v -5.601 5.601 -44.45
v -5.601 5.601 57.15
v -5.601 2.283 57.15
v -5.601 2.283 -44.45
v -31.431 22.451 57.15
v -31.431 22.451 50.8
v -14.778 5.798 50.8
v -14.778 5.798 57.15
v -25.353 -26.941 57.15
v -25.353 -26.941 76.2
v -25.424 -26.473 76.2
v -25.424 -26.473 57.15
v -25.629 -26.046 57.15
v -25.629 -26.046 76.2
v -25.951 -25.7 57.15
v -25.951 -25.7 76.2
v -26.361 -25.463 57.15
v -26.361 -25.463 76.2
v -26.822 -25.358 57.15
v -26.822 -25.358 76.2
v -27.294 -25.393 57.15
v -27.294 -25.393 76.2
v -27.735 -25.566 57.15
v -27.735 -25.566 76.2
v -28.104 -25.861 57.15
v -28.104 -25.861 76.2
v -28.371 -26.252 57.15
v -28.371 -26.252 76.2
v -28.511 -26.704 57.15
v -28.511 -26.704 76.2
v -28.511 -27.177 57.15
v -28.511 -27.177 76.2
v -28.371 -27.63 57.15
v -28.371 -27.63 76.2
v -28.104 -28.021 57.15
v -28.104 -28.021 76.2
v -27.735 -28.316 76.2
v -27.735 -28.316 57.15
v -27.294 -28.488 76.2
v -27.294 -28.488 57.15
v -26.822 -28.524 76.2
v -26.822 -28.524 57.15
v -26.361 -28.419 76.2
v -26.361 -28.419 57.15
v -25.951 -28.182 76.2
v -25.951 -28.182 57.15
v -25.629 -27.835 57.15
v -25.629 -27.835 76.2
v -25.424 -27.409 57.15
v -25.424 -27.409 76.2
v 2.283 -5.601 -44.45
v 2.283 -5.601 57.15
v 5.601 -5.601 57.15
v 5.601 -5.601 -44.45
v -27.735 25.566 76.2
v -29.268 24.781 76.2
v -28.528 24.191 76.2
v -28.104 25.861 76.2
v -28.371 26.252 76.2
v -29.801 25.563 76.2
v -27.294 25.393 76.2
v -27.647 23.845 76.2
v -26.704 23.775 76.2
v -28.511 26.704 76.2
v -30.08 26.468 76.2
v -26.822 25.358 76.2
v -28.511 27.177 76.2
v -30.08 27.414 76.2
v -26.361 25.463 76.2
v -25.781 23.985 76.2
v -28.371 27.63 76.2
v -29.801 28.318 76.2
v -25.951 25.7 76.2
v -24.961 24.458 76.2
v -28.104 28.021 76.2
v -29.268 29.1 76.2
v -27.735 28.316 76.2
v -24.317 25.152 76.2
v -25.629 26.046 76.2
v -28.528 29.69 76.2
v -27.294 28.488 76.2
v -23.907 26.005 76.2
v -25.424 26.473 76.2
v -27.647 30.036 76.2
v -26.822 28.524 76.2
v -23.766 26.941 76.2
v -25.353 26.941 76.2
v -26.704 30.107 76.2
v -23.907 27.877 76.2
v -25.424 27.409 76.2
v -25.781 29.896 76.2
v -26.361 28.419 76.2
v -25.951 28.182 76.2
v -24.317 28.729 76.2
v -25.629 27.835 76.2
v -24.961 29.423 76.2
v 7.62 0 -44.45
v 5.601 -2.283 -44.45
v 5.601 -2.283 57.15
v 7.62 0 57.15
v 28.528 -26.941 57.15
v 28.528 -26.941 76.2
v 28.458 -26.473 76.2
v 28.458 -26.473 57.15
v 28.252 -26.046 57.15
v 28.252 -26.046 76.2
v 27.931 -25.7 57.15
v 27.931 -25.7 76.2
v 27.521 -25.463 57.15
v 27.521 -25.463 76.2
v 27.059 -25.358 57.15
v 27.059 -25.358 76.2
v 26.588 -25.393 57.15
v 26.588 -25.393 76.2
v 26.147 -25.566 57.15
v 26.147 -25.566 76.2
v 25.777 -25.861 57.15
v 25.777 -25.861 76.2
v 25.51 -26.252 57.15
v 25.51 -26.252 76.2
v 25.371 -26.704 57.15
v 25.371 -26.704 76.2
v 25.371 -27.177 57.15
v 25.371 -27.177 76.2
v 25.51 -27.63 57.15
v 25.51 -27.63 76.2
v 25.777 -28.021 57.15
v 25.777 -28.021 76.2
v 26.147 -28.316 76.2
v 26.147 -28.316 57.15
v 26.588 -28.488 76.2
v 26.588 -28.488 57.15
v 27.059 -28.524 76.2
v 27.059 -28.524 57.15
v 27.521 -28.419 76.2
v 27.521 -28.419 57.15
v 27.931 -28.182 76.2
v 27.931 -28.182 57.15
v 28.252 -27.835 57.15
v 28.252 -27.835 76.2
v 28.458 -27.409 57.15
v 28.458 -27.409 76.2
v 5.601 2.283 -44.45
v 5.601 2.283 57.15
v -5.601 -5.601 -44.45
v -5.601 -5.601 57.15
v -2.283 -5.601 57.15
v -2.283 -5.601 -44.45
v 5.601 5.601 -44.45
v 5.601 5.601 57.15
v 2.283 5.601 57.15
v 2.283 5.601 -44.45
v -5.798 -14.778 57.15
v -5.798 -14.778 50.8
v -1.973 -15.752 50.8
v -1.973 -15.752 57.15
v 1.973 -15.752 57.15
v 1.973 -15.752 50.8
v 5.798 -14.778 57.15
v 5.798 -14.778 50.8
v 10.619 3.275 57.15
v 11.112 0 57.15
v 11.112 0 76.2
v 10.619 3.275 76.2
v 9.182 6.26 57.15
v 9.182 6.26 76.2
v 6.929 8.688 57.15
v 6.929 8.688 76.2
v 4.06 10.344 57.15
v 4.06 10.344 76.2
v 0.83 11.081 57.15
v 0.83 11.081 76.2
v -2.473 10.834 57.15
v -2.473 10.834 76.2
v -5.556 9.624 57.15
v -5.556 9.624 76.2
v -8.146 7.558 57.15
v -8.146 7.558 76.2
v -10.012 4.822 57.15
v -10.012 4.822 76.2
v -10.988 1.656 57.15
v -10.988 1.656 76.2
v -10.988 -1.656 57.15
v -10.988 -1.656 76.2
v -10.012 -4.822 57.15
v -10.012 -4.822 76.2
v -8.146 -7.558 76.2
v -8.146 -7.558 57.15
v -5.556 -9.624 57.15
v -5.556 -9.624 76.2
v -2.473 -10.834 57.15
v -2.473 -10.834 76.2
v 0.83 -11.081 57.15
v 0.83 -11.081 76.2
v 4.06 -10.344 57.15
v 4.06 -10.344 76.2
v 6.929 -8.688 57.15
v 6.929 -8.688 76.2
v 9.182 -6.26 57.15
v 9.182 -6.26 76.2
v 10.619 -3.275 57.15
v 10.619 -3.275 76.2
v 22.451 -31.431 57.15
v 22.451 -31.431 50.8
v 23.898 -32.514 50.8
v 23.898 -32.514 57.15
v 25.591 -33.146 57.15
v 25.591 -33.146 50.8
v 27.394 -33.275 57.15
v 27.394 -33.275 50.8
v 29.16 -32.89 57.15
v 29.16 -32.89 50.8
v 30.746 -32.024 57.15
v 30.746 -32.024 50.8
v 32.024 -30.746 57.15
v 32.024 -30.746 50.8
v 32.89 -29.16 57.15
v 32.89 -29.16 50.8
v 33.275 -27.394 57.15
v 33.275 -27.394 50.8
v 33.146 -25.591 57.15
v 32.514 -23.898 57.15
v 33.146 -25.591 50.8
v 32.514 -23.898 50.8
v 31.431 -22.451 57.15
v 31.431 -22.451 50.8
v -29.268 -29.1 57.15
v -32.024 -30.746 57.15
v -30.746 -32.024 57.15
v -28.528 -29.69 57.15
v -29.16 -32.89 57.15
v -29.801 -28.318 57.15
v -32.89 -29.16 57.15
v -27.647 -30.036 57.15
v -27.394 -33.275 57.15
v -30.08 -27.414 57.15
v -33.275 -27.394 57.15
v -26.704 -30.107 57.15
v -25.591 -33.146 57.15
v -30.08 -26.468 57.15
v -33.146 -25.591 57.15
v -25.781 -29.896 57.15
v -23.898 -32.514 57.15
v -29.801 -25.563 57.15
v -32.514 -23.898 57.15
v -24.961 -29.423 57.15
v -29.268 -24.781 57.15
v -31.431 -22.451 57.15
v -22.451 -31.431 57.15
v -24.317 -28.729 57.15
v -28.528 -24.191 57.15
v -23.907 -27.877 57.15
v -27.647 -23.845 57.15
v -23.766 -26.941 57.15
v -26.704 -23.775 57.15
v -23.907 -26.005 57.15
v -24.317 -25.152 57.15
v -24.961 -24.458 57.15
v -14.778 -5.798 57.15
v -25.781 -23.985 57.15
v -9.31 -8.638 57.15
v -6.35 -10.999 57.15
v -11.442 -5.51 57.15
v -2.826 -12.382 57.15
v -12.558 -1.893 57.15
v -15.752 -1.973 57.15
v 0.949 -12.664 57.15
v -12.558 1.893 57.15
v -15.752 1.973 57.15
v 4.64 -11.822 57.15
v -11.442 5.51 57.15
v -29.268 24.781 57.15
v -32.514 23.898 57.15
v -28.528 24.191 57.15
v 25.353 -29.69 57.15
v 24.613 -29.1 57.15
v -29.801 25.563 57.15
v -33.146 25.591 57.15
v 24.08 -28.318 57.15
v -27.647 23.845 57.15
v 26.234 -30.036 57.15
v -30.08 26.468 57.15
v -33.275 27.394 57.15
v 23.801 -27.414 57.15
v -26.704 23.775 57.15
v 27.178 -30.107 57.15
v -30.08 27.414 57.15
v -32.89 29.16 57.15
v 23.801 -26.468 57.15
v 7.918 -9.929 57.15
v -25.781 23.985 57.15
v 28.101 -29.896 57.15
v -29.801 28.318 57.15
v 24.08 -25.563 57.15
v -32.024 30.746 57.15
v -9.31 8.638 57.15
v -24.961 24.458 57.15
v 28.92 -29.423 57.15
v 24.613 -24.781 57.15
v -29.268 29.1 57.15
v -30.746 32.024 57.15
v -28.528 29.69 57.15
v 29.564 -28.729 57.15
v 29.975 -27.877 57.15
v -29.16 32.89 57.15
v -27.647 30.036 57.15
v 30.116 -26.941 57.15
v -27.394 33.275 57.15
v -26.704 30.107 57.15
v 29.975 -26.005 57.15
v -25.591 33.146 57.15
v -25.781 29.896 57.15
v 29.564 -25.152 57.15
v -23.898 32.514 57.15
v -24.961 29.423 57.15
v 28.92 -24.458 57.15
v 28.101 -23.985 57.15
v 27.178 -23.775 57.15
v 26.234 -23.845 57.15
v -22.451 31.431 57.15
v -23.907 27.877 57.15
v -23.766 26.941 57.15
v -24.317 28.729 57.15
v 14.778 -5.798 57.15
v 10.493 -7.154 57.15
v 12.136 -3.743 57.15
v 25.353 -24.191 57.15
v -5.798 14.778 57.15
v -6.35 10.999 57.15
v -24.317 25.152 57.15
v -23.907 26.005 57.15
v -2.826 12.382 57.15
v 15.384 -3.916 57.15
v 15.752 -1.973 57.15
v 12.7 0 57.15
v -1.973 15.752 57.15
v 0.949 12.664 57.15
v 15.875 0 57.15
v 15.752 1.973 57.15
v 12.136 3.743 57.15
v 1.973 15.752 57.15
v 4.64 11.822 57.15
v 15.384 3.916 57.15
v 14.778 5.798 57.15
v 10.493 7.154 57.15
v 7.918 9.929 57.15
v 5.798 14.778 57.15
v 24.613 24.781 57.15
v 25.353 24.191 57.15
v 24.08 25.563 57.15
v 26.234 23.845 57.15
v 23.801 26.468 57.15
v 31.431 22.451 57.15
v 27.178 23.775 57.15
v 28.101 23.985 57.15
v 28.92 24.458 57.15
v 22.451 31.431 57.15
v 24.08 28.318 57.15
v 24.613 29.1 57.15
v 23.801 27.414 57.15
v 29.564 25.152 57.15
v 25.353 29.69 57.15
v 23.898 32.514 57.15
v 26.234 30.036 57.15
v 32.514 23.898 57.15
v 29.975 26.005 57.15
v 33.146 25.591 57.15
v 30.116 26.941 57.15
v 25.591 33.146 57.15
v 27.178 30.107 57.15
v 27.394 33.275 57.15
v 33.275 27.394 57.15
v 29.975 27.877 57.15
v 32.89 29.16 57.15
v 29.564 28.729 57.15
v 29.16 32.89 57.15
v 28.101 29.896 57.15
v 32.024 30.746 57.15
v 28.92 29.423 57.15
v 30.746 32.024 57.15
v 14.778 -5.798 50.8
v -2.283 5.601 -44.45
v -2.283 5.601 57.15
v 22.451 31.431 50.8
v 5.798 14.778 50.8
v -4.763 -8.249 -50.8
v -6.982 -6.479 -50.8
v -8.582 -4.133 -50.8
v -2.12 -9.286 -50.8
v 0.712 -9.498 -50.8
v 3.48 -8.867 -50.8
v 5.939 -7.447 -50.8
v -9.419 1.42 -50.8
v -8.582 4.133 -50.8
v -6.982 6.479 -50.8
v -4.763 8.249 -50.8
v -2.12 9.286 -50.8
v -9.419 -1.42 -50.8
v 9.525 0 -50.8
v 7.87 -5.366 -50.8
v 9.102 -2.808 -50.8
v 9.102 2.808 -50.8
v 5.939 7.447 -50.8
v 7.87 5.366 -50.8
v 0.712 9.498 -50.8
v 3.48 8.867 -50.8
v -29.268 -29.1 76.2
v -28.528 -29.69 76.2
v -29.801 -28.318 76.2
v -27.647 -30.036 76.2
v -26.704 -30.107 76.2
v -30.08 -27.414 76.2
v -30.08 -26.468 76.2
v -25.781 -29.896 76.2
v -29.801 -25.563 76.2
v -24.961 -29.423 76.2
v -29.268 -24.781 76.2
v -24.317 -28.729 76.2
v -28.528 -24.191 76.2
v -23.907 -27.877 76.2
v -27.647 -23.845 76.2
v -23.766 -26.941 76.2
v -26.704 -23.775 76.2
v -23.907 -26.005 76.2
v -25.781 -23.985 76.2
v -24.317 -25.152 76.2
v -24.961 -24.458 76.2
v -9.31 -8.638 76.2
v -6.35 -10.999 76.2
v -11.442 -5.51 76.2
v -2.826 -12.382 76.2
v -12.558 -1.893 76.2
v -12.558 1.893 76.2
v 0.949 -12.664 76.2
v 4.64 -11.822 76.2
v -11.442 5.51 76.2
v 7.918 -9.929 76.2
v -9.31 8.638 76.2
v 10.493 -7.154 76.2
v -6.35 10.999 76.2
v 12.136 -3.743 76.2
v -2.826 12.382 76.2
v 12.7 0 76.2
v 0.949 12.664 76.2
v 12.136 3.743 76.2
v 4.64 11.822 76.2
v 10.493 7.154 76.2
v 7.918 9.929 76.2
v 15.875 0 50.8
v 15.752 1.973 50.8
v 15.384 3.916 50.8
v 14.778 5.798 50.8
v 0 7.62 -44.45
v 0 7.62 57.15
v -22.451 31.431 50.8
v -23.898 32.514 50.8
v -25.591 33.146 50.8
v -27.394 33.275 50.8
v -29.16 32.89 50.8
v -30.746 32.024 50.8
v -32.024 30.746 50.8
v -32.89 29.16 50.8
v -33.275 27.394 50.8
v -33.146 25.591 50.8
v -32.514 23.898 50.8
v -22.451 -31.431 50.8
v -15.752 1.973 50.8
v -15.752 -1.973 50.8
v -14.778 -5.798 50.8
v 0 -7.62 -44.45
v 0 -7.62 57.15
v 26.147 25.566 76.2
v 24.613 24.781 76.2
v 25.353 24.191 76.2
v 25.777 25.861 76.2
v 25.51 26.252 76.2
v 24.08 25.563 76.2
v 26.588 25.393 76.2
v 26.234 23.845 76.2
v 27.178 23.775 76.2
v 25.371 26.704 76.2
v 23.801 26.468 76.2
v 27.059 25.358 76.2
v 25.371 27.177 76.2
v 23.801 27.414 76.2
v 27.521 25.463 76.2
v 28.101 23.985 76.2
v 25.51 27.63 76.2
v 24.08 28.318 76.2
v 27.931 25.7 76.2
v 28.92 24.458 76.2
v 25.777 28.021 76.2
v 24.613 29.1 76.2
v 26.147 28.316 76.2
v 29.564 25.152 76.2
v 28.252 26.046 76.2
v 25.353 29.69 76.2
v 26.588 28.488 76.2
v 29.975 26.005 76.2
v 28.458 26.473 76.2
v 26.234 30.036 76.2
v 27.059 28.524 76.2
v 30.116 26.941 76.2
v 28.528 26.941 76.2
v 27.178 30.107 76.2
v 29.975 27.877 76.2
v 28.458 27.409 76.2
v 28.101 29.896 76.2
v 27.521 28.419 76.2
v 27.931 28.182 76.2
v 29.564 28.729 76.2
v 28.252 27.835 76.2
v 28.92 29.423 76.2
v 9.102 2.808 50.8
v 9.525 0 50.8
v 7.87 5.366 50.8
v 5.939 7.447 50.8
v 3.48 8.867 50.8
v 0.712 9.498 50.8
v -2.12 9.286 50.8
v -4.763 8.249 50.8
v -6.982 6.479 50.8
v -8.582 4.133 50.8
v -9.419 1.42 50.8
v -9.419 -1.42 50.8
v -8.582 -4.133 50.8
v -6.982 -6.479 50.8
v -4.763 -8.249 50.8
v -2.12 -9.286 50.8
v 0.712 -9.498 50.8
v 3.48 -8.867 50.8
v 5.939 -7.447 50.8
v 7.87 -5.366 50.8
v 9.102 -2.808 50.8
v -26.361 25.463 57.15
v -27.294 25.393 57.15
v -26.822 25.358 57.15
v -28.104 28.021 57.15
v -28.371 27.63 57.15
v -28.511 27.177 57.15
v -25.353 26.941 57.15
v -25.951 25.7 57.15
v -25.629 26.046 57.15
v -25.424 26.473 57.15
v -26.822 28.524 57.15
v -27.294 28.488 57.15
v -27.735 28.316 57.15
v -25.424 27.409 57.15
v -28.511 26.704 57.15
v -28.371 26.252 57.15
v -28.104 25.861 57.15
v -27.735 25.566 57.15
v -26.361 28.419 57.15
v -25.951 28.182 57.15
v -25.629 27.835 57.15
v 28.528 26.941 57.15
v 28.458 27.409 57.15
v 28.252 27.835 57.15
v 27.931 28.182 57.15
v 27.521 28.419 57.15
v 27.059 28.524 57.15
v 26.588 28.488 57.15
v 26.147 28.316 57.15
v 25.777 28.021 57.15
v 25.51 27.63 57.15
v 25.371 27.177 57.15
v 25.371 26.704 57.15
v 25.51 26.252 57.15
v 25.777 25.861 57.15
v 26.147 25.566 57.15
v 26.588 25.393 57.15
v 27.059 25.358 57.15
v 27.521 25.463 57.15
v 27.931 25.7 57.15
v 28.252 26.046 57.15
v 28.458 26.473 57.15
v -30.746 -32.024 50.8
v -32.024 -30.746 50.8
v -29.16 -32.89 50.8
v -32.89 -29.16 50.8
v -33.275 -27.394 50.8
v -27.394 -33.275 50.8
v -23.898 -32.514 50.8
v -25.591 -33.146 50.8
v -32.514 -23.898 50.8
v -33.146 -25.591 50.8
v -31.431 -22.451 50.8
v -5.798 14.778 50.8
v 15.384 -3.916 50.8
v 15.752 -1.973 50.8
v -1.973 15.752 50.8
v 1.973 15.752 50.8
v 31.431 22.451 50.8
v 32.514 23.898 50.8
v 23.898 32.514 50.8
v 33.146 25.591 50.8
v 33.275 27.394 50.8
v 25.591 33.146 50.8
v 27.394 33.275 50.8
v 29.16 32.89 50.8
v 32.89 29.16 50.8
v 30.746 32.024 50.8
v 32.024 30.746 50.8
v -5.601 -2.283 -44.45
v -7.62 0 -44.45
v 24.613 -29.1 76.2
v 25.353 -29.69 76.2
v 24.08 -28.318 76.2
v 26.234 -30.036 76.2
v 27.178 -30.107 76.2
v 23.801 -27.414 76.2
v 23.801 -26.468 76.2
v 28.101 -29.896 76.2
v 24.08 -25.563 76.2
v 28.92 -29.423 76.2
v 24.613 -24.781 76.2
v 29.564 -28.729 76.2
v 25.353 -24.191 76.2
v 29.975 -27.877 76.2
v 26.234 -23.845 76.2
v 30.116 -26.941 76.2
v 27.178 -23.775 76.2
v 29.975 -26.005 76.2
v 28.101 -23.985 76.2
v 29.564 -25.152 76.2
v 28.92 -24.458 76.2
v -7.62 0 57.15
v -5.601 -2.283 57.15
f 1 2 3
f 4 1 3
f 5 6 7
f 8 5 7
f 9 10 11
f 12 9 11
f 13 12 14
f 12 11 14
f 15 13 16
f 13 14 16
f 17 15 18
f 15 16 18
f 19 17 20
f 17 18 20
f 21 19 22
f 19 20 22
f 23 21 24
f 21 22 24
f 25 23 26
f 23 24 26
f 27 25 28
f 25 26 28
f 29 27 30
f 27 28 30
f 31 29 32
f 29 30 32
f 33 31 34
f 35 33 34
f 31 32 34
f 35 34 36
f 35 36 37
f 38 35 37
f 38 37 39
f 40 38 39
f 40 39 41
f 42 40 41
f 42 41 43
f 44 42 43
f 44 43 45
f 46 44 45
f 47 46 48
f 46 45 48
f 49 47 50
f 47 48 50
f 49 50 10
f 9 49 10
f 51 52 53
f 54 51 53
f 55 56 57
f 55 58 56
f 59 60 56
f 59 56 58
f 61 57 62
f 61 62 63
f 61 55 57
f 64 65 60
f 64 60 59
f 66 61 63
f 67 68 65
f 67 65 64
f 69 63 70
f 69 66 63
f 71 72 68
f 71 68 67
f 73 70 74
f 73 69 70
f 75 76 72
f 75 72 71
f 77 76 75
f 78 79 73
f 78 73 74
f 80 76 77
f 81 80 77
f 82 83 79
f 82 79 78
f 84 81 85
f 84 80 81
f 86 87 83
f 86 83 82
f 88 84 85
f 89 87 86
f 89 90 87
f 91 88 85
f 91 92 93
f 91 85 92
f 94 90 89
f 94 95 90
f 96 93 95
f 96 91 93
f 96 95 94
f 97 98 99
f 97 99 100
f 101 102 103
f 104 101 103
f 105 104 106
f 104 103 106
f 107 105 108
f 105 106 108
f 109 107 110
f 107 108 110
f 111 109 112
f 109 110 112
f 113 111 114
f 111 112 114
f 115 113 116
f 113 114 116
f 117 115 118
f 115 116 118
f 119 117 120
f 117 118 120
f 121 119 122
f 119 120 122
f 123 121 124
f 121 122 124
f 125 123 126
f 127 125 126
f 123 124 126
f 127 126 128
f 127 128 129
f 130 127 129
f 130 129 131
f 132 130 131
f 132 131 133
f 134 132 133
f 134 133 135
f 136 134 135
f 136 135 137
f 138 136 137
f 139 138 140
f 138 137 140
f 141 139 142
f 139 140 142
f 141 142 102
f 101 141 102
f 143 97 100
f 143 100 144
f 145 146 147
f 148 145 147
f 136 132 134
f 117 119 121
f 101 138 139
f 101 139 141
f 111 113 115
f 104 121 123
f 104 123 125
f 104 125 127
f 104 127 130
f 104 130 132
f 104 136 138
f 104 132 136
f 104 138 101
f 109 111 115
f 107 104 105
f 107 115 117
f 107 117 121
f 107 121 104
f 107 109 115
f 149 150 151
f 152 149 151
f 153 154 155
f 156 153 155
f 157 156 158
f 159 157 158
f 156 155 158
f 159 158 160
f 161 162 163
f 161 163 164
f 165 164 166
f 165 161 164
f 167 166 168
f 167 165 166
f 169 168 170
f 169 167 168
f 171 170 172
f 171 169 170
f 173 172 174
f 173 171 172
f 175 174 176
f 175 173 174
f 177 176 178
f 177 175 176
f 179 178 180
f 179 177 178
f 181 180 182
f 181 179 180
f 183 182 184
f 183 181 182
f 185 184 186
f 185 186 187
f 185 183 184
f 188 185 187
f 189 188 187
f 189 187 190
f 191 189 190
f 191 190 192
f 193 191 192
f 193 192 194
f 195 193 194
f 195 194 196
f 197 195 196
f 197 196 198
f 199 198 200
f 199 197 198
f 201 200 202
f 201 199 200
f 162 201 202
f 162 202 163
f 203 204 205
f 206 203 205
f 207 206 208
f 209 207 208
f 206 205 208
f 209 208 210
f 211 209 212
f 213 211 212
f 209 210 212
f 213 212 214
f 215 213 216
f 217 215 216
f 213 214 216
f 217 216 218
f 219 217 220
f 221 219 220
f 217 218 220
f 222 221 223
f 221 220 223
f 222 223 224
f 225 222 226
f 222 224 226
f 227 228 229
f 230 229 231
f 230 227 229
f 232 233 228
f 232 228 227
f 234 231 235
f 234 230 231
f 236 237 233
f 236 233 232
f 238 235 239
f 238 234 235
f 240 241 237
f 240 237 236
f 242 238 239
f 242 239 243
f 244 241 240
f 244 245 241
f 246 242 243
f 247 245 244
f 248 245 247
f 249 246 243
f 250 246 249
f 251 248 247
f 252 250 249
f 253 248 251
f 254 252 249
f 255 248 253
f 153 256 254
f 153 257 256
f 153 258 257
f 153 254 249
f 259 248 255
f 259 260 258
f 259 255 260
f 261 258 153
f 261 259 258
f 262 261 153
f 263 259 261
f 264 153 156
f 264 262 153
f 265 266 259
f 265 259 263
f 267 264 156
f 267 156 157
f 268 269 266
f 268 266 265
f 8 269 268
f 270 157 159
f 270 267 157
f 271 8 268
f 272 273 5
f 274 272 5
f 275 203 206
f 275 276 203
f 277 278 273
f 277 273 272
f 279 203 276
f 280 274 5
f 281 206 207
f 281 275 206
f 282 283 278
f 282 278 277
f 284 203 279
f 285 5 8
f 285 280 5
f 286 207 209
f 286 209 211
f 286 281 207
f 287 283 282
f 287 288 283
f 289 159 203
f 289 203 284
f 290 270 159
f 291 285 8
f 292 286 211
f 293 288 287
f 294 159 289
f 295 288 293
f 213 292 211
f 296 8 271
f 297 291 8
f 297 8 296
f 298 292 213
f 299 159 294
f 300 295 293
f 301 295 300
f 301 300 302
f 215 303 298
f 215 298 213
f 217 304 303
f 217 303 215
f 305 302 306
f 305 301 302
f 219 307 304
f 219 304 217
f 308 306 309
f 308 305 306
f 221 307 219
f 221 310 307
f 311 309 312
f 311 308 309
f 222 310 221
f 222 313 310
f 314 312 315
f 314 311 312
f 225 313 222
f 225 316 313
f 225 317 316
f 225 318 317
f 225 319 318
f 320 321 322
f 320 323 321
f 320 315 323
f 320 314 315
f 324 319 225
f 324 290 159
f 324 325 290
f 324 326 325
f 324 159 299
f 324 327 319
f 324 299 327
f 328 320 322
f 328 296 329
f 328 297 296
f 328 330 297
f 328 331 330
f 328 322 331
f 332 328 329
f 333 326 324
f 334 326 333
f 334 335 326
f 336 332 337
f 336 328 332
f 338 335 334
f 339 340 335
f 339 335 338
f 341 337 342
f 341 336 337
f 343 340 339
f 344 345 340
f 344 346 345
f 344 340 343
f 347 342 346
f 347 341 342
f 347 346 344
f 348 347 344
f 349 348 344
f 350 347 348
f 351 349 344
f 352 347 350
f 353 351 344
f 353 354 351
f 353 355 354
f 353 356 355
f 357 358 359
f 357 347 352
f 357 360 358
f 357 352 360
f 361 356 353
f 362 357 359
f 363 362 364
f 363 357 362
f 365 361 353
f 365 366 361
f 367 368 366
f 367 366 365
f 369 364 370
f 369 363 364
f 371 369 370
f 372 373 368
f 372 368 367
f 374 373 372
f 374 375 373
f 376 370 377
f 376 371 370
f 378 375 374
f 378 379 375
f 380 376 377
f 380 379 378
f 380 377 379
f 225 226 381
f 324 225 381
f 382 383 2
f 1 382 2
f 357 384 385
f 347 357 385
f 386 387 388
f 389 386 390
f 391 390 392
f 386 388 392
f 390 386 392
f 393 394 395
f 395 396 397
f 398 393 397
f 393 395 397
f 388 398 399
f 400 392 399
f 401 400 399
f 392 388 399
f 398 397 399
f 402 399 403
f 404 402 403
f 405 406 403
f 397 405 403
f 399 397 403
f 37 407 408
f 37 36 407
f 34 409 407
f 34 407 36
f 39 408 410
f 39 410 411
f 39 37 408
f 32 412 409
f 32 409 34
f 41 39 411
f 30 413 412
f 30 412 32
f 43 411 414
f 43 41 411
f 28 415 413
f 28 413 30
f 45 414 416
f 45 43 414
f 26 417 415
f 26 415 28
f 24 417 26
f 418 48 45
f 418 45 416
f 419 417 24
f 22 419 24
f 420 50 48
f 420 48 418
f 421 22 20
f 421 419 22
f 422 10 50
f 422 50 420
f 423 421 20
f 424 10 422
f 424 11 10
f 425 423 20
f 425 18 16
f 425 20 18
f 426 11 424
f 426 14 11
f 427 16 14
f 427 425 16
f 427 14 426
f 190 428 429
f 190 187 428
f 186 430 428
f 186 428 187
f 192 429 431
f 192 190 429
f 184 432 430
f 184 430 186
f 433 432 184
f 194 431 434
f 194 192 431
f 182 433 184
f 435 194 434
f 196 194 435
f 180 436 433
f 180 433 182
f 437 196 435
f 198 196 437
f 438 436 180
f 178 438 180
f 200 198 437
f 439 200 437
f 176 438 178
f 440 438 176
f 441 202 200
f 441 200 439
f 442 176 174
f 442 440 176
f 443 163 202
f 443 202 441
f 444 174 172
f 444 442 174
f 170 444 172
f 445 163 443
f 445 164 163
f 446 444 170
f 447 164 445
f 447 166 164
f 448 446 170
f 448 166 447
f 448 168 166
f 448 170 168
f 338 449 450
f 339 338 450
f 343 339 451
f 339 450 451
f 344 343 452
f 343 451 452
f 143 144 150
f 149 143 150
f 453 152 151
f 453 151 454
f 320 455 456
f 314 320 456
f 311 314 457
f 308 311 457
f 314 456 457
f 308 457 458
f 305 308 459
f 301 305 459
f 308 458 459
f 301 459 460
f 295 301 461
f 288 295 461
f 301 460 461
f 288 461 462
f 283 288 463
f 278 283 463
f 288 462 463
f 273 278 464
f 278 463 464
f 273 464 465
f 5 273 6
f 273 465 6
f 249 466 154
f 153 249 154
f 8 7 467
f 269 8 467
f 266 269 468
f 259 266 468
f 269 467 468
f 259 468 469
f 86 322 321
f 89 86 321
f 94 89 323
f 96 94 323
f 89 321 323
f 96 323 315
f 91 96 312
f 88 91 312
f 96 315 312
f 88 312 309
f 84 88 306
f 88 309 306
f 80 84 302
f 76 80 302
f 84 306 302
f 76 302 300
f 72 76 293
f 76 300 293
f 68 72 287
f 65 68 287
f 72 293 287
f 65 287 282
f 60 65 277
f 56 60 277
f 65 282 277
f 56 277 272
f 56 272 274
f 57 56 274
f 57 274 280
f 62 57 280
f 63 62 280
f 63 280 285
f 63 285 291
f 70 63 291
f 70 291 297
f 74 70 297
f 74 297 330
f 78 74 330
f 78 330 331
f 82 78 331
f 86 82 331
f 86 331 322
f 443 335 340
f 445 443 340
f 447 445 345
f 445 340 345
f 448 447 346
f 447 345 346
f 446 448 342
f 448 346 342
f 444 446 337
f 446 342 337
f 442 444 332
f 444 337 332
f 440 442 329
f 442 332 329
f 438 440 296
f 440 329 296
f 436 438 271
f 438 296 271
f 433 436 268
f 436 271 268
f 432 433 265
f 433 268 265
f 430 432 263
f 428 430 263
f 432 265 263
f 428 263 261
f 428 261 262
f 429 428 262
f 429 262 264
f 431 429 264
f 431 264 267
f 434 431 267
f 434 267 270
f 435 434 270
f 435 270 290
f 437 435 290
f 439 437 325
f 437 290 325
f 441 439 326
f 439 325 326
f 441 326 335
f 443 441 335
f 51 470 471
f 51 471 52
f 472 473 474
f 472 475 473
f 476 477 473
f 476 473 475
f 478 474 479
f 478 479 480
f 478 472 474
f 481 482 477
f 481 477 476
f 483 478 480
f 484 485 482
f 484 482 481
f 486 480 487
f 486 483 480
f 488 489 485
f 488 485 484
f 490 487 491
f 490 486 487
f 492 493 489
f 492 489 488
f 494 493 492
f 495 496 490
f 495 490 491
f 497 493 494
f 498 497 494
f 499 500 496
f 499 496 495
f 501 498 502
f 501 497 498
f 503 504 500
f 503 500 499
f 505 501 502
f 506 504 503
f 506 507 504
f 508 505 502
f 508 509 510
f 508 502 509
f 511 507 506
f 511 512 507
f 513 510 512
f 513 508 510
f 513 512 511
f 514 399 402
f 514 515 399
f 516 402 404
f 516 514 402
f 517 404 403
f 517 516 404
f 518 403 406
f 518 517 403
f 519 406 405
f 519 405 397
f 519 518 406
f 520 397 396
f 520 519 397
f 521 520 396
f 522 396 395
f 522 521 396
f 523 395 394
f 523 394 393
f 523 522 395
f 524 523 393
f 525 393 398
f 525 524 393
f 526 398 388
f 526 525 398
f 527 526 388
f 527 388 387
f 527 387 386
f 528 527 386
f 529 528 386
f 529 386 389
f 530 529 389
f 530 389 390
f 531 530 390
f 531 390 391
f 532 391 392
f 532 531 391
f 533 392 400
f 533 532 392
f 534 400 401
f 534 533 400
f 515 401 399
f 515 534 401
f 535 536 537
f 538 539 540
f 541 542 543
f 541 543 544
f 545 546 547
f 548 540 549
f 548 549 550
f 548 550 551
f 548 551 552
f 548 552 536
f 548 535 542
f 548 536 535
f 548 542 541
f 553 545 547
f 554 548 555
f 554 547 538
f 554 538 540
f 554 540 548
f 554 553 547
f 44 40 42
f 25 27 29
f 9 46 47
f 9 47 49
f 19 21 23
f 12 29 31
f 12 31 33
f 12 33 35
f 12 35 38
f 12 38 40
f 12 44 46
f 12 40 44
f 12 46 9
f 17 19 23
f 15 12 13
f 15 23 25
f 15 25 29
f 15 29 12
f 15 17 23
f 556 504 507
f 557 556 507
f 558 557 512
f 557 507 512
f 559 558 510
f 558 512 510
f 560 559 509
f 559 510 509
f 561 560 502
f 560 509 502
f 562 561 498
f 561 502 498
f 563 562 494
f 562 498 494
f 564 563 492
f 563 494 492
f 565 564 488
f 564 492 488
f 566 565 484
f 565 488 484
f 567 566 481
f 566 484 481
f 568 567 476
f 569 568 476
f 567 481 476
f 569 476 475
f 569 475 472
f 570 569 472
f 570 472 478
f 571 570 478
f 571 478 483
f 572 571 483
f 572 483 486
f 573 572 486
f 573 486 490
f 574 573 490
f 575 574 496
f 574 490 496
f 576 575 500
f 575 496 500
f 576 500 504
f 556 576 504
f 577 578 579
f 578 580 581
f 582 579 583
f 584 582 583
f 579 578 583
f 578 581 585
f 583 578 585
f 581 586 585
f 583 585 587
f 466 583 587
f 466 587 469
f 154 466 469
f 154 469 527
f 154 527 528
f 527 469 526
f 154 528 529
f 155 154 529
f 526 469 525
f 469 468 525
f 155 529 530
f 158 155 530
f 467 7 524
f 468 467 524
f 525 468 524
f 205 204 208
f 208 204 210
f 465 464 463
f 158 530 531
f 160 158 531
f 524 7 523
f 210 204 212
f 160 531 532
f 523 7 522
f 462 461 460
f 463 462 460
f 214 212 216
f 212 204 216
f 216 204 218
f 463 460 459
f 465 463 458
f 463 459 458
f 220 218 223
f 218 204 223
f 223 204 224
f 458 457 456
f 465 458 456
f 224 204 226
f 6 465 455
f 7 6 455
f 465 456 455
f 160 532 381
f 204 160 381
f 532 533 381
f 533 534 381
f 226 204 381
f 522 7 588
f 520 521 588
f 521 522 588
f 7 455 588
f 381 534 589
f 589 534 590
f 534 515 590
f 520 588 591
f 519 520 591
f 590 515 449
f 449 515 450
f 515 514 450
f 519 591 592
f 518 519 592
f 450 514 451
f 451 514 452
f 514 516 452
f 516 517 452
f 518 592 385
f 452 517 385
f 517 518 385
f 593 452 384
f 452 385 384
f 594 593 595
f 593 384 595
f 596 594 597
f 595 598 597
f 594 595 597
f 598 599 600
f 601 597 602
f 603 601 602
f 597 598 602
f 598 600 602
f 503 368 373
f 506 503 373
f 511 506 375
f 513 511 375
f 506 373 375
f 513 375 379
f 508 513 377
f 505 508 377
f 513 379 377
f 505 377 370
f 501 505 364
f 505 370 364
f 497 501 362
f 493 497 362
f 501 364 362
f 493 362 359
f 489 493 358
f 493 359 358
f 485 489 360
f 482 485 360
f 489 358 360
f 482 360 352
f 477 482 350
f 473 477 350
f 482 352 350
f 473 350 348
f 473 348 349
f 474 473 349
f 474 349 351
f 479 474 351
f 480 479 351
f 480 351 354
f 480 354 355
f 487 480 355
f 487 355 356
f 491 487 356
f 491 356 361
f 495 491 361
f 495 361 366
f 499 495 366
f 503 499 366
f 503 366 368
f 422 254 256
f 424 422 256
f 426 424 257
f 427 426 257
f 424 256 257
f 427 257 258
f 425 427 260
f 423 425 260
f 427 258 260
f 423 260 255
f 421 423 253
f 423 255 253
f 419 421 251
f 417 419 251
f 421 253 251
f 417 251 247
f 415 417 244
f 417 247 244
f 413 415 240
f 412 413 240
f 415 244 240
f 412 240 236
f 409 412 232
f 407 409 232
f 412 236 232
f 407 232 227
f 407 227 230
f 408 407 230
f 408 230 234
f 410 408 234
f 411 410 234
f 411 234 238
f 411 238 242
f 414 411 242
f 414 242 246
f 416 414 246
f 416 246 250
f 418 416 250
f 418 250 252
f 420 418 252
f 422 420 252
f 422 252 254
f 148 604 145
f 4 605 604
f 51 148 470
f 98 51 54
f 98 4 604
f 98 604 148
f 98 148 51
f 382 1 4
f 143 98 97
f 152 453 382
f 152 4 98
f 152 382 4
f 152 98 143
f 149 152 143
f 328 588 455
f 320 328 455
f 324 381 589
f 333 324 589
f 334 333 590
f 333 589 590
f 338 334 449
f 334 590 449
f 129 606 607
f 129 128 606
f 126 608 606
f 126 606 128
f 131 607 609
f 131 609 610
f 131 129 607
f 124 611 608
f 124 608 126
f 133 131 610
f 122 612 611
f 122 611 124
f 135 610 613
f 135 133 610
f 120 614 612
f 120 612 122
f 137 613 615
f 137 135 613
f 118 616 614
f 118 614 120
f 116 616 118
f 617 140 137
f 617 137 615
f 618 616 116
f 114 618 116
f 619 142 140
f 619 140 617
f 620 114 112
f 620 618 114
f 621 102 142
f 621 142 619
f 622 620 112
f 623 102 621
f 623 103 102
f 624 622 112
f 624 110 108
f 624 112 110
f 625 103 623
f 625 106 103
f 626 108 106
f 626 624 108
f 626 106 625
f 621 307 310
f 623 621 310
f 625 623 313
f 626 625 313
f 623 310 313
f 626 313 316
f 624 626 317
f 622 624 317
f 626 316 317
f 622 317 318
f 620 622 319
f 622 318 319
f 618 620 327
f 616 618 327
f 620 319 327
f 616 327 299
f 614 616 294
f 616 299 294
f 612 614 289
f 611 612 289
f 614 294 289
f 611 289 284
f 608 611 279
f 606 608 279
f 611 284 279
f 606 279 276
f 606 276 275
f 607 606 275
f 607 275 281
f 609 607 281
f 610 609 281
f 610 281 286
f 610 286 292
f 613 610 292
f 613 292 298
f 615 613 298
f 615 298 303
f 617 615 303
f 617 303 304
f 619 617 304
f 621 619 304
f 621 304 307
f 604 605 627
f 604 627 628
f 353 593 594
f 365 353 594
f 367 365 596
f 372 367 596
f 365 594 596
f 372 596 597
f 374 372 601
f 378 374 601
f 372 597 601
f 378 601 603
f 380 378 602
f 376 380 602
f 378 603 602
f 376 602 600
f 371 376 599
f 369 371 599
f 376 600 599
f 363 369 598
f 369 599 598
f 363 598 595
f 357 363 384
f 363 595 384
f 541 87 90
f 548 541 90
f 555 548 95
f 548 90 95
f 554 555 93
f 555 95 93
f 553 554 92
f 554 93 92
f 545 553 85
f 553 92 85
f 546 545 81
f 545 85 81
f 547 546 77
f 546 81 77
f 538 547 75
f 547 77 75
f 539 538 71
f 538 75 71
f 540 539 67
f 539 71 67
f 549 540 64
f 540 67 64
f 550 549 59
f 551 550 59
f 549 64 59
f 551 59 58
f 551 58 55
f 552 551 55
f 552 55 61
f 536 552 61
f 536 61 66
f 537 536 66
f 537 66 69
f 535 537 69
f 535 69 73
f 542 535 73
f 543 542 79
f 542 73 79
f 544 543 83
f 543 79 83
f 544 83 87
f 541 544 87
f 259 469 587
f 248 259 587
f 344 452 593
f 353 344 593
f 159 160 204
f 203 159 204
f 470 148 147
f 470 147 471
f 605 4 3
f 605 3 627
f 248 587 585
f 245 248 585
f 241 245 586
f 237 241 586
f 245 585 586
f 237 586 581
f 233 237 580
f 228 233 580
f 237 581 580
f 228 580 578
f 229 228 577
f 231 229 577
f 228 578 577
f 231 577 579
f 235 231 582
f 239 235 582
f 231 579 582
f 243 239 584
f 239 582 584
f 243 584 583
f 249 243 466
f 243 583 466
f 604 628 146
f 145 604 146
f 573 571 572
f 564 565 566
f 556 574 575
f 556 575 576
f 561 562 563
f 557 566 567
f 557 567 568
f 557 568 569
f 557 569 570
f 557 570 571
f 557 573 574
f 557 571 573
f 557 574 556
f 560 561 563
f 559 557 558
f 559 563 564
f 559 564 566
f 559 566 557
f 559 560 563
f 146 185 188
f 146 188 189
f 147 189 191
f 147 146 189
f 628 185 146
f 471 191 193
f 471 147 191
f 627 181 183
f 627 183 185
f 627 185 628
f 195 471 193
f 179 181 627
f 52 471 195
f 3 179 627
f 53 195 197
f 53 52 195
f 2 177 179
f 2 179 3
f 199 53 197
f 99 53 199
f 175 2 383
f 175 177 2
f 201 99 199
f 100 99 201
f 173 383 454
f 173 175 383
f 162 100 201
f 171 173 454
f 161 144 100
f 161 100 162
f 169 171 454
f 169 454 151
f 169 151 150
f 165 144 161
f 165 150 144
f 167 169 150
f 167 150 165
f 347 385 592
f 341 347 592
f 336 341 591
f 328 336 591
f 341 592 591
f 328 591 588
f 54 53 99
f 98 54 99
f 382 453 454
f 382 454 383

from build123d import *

# Parameters (mm, degrees)
F0_R     = 9.525
F1_DEPTH = 50.8
F2_R     = 9.525
F2_R_2   = 3.175
F3_DEPTH = 6.35
F4_DEPTH = 25.4
F6_DEPTH = 101.6
F5_R     = 12.7
F5_R_2   = 11.1125
F7_DEPTH = 19.05
F8_R     = 1.5875
F9_DEPTH = 19.05


with BuildPart() as f1:
    # F0 (on Top) → F1 (new body, symmetric)
    with BuildSketch(Plane.XY):
        Circle(F0_R)
    extrude(amount=F1_DEPTH, both=True)

    # F2 (on face) → F3 (join)
    with BuildSketch(Plane.XY.offset(50.8)):
        with BuildLine():
            ThreePointArc((14.7783039193, -5.7980477982), (15.5984165818, -2.9504279589), (15.875, 0))
            ThreePointArc((15.875, 0), (15.5984165818, 2.9504279589), (14.7783039193, 5.7980477982))
            ThreePointArc((14.7783039193, 5.7980477982), (11.2253201513, 11.2253201513), (5.7980477982, 14.7783039193))
            ThreePointArc((5.7980477982, 14.7783039193), (0, 15.875), (-5.7980477982, 14.7783039193))
            ThreePointArc((-5.7980477982, 14.7783039193), (-11.2253201513, 11.2253201513), (-14.7783039193, 5.7980477982))
            ThreePointArc((-14.7783039193, 5.7980477982), (-15.875, 0), (-14.7783039193, -5.7980477982))
            ThreePointArc((-14.7783039193, -5.7980477982), (-11.2253201513, -11.2253201513), (-5.7980477982, -14.7783039193))
            ThreePointArc((-5.7980477982, -14.7783039193), (0, -15.875), (5.7980477982, -14.7783039193))
            ThreePointArc((5.7980477982, -14.7783039193), (11.2253201513, -11.2253201513), (14.7783039193, -5.7980477982))
        make_face()
        Circle(F2_R, mode=Mode.SUBTRACT)
        with BuildLine():
            ThreePointArc((5.7980477982, 14.7783039193), (11.2253201513, 11.2253201513), (14.7783039193, 5.7980477982))
            Line((14.7783039193, 5.7980477982), (31.4308964237, 22.4506403027))
            ThreePointArc((31.4308964237, 22.4506403027), (31.4308964237, 31.4308964237), (22.4506403027, 31.4308964237))
            Line((22.4506403027, 31.4308964237), (5.7980477982, 14.7783039193))
        make_face()
        with Locations((26.9407683632, 26.9407683632)):
            Circle(F2_R_2, mode=Mode.SUBTRACT)
        with BuildLine():
            Line((-22.4506403027, -31.4308964237), (-5.7980477982, -14.7783039193))
            ThreePointArc((-5.7980477982, -14.7783039193), (-11.2253201513, -11.2253201513), (-14.7783039193, -5.7980477982))
            Line((-14.7783039193, -5.7980477982), (-31.4308964237, -22.4506403027))
            ThreePointArc((-31.4308964237, -22.4506403027), (-31.4308964237, -31.4308964237), (-22.4506403027, -31.4308964237))
        make_face()
        with Locations((-26.9407683632, -26.9407683632)):
            Circle(F2_R_2, mode=Mode.SUBTRACT)
        with BuildLine():
            Line((31.4308964237, -22.4506403027), (14.7783039193, -5.7980477982))
            ThreePointArc((14.7783039193, -5.7980477982), (11.2253201513, -11.2253201513), (5.7980477982, -14.7783039193))
            Line((5.7980477982, -14.7783039193), (22.4506403027, -31.4308964237))
            ThreePointArc((22.4506403027, -31.4308964237), (31.4308964237, -31.4308964237), (31.4308964237, -22.4506403027))
        make_face()
        with Locations((26.9407683632, -26.9407683632)):
            Circle(F2_R_2, mode=Mode.SUBTRACT)
        with BuildLine():
            ThreePointArc((-14.7783039193, 5.7980477982), (-11.2253201513, 11.2253201513), (-5.7980477982, 14.7783039193))
            Line((-5.7980477982, 14.7783039193), (-22.4506403027, 31.4308964237))
            ThreePointArc((-22.4506403027, 31.4308964237), (-31.4308964237, 31.4308964237), (-31.4308964237, 22.4506403027))
            Line((-31.4308964237, 22.4506403027), (-14.7783039193, 5.7980477982))
        make_face()
        with Locations((-26.9407683632, 26.9407683632)):
            Circle(F2_R_2, mode=Mode.SUBTRACT)
        Circle(F2_R)
    extrude(amount=F3_DEPTH)

    # F2 (on face) → F4 (join)
    with BuildSketch(Plane.XY.offset(50.8)):
        with Locations((-26.9407683632, 26.9407683632)):
            Circle(F2_R_2)
        with Locations((26.9407683632, 26.9407683632)):
            Circle(F2_R_2)
        with Locations((26.9407683632, -26.9407683632)):
            Circle(F2_R_2)
        with Locations((-26.9407683632, -26.9407683632)):
            Circle(F2_R_2)
    extrude(amount=F4_DEPTH)

    # F5 (on face) → F6 (cut)
    with BuildSketch(Plane.XY.offset(57.15)):
        Polygon((-5.6006181585, 2.2830683253), (-7.62, 0), (-5.6006181585, -2.2830683253), (-5.6006181585, -5.6006181585), (-2.2830683253, -5.6006181585), (0, -7.62), (2.2830683253, -5.6006181585), (5.6006181585, -5.6006181585), (5.6006181585, -2.2830683253), (7.62, 0), (5.6006181585, 2.2830683253), (5.6006181585, 5.6006181585), (2.2830683253, 5.6006181585), (0, 7.62), (-2.2830683253, 5.6006181585), (-5.6006181585, 5.6006181585), align=None)
    extrude(amount=-F6_DEPTH, mode=Mode.SUBTRACT)

    # F5 (on face) → F7 (join)
    with BuildSketch(Plane.XY.offset(57.15)):
        Circle(F5_R)
        Circle(F5_R_2, mode=Mode.SUBTRACT)
    extrude(amount=F7_DEPTH)

    # F8 (on face) → F9 (cut)
    with BuildSketch(Plane.XY.offset(76.2)):
        with Locations((26.9407683632, -26.9407683632)):
            Circle(F8_R)
        with Locations((-26.9407683632, -26.9407683632)):
            Circle(F8_R)
        with Locations((26.9407683632, 26.9407683632)):
            Circle(F8_R)
        with Locations((-26.9407683632, 26.9407683632)):
            Circle(F8_R)
    extrude(amount=-F9_DEPTH, mode=Mode.SUBTRACT)


solid = f1.part
